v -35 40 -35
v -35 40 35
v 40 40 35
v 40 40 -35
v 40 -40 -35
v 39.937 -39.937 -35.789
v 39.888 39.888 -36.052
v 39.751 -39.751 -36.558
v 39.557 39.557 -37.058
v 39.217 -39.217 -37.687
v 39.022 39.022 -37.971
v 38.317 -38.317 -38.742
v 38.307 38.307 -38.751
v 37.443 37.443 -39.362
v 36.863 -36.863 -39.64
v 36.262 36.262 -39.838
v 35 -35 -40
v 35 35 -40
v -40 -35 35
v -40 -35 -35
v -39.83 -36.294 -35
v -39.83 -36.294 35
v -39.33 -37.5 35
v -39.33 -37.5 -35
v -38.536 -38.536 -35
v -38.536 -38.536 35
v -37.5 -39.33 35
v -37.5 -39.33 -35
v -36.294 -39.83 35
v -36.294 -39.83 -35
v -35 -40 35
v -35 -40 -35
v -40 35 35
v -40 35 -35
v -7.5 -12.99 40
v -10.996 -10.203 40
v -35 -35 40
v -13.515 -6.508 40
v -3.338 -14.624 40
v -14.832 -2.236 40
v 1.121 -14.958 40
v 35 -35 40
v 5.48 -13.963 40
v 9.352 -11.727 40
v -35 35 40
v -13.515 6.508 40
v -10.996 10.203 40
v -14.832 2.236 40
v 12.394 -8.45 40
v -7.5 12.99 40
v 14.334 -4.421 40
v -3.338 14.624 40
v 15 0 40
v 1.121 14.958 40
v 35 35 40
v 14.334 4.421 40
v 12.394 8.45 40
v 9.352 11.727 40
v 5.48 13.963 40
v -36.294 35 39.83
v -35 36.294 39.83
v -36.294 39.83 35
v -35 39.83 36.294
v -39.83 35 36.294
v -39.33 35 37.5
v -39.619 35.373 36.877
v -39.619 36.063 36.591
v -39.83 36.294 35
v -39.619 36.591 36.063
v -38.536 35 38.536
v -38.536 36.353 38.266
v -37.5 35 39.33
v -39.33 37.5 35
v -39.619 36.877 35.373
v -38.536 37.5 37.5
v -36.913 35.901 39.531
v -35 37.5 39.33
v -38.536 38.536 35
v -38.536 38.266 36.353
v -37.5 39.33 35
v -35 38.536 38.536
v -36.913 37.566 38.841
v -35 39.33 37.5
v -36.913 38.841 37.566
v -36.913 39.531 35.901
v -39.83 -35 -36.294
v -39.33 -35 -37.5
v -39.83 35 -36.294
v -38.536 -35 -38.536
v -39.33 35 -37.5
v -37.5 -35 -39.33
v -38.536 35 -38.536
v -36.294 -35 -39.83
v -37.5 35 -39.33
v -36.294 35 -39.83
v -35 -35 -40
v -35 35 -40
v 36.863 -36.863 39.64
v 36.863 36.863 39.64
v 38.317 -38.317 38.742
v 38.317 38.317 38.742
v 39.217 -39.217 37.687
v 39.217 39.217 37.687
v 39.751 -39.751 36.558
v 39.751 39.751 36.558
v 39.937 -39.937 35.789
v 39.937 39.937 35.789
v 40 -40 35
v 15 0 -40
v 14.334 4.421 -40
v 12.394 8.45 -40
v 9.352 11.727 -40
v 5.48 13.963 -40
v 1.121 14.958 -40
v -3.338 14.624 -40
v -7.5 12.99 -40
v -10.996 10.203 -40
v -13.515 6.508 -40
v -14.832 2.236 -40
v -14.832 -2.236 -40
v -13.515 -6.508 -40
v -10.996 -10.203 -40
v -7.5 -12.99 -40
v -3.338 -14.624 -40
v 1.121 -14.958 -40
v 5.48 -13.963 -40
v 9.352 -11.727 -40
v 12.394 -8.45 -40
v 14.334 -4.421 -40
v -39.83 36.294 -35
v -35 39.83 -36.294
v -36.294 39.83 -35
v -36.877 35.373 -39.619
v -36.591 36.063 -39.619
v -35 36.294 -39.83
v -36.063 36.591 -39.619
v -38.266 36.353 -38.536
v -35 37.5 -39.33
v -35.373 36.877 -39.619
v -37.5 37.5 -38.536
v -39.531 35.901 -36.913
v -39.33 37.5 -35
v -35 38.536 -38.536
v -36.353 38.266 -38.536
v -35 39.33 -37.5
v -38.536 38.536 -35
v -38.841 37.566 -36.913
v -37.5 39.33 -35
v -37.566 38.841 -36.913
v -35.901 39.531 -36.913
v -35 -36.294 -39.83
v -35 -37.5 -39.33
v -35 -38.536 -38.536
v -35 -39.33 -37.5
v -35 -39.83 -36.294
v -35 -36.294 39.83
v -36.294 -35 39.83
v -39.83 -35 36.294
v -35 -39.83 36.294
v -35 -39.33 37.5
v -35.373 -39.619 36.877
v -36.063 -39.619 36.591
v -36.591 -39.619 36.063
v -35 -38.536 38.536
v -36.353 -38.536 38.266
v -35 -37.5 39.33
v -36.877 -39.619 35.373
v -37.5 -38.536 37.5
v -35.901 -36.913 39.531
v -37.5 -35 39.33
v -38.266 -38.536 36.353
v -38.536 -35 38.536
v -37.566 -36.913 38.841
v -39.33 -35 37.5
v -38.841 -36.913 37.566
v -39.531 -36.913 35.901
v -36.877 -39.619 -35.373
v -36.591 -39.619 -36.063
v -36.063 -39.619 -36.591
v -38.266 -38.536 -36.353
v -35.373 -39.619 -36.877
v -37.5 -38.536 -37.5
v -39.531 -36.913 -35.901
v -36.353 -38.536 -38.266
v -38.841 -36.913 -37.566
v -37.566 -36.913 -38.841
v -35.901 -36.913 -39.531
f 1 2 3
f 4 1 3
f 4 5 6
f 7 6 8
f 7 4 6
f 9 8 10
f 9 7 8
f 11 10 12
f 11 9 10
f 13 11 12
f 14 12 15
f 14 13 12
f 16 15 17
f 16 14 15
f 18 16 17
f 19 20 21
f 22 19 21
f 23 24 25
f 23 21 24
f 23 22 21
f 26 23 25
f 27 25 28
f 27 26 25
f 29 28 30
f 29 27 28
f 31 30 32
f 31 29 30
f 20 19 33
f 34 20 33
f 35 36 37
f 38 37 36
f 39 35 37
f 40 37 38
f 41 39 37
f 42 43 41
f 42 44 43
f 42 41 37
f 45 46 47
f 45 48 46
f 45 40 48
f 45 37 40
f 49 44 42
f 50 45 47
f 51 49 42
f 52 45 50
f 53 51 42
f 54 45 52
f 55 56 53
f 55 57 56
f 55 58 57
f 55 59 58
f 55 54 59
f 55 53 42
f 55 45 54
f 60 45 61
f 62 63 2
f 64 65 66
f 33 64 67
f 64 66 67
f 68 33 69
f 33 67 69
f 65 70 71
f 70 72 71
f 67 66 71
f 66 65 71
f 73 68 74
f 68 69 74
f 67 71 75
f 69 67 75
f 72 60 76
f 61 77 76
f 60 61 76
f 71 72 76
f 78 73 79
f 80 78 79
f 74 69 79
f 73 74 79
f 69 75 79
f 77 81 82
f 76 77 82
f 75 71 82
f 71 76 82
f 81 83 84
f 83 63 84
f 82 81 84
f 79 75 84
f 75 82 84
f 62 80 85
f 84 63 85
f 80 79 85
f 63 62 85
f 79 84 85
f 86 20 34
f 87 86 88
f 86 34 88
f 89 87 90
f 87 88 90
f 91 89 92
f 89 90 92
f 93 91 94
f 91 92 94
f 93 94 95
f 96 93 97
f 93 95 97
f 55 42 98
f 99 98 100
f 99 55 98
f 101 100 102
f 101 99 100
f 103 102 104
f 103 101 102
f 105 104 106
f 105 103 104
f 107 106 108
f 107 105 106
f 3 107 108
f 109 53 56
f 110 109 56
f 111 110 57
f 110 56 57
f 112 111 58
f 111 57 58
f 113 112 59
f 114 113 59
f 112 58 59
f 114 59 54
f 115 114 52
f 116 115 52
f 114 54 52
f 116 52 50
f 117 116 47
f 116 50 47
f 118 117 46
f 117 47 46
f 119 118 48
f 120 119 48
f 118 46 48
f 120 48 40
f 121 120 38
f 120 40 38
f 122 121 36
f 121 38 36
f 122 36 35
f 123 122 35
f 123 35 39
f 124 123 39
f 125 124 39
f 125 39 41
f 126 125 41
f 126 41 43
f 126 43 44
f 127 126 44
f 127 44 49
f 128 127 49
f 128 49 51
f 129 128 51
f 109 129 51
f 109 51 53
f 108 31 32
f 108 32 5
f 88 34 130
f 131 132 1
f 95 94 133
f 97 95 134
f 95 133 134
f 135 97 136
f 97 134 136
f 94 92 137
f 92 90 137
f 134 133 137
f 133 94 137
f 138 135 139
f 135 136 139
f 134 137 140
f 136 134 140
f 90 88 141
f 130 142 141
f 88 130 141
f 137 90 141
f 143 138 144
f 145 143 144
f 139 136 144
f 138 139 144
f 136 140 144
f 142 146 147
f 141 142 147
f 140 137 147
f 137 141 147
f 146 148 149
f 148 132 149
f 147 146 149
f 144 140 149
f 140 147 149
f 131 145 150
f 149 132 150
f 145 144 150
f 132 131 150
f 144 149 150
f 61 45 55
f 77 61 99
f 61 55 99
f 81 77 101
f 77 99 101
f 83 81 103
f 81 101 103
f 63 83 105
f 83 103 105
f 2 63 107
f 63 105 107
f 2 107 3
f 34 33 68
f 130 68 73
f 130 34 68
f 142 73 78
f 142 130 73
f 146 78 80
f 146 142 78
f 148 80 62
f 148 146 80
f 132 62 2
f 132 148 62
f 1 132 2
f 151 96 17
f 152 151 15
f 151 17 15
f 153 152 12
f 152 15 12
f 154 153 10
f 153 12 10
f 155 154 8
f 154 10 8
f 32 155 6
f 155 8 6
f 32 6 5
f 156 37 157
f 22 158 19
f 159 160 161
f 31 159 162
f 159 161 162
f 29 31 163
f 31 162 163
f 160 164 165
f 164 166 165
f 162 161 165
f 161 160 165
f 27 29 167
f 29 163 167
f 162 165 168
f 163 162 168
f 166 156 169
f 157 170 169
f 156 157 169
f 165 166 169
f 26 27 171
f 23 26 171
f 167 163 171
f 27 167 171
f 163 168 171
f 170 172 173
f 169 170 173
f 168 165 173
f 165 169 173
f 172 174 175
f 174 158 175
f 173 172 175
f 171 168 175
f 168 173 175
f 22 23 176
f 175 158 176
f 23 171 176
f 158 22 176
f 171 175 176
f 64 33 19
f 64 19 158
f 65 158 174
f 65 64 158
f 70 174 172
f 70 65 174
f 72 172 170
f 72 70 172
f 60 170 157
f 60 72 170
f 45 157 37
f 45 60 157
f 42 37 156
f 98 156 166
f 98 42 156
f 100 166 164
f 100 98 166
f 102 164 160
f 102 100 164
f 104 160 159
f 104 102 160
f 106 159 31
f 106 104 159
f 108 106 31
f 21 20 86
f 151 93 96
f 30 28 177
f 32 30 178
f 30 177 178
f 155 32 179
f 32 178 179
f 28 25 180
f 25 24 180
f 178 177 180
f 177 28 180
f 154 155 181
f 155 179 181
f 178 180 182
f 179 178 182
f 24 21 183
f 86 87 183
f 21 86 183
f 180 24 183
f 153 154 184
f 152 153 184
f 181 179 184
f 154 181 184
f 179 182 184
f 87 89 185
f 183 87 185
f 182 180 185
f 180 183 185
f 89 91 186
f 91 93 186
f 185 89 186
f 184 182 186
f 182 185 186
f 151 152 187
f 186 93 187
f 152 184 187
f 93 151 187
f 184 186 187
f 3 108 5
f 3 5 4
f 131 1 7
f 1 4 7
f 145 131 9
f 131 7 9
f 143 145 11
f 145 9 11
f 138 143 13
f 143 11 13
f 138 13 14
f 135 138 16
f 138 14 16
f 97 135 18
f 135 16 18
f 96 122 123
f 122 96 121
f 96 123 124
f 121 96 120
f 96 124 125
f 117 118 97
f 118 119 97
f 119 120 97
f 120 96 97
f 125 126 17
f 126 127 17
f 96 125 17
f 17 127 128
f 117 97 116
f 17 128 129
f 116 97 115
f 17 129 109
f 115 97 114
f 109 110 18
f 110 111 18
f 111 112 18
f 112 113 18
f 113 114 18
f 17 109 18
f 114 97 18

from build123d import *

# Parameters (mm, degrees)
F0_W     = 80
F0_H     = 80
F1_DEPTH = 40
F2_R     = 5
F3_R     = 15
F4_DEPTH = 80.001


with BuildPart() as f1:
    # F0 (on Top) → F1 (new body, symmetric)
    with BuildSketch(Plane.XY):
        Rectangle(F0_W, F0_H)
    extrude(amount=F1_DEPTH, both=True)

    # F2
    f2_edges = [f1.edges().sort_by_distance(p)[0] for p in [
        (40, 0, 40),
        (0, 40, 40),
        (-40, 0, 40),
        (0, -40, 40),
        (-40, 40, 0),
        (-40, 0, -40),
        (-40, -40, 0),
        (0, 40, -40),
        (0, -40, -40),
        (40, 0, -40),
    ]]
    fillet(f2_edges, radius=F2_R)

    # F3 (on face) → F4 (cut, through all)
    with BuildSketch(Plane.XY.offset(40)):
        Circle(F3_R)
    extrude(amount=-F4_DEPTH, mode=Mode.SUBTRACT)


solid = f1.part
